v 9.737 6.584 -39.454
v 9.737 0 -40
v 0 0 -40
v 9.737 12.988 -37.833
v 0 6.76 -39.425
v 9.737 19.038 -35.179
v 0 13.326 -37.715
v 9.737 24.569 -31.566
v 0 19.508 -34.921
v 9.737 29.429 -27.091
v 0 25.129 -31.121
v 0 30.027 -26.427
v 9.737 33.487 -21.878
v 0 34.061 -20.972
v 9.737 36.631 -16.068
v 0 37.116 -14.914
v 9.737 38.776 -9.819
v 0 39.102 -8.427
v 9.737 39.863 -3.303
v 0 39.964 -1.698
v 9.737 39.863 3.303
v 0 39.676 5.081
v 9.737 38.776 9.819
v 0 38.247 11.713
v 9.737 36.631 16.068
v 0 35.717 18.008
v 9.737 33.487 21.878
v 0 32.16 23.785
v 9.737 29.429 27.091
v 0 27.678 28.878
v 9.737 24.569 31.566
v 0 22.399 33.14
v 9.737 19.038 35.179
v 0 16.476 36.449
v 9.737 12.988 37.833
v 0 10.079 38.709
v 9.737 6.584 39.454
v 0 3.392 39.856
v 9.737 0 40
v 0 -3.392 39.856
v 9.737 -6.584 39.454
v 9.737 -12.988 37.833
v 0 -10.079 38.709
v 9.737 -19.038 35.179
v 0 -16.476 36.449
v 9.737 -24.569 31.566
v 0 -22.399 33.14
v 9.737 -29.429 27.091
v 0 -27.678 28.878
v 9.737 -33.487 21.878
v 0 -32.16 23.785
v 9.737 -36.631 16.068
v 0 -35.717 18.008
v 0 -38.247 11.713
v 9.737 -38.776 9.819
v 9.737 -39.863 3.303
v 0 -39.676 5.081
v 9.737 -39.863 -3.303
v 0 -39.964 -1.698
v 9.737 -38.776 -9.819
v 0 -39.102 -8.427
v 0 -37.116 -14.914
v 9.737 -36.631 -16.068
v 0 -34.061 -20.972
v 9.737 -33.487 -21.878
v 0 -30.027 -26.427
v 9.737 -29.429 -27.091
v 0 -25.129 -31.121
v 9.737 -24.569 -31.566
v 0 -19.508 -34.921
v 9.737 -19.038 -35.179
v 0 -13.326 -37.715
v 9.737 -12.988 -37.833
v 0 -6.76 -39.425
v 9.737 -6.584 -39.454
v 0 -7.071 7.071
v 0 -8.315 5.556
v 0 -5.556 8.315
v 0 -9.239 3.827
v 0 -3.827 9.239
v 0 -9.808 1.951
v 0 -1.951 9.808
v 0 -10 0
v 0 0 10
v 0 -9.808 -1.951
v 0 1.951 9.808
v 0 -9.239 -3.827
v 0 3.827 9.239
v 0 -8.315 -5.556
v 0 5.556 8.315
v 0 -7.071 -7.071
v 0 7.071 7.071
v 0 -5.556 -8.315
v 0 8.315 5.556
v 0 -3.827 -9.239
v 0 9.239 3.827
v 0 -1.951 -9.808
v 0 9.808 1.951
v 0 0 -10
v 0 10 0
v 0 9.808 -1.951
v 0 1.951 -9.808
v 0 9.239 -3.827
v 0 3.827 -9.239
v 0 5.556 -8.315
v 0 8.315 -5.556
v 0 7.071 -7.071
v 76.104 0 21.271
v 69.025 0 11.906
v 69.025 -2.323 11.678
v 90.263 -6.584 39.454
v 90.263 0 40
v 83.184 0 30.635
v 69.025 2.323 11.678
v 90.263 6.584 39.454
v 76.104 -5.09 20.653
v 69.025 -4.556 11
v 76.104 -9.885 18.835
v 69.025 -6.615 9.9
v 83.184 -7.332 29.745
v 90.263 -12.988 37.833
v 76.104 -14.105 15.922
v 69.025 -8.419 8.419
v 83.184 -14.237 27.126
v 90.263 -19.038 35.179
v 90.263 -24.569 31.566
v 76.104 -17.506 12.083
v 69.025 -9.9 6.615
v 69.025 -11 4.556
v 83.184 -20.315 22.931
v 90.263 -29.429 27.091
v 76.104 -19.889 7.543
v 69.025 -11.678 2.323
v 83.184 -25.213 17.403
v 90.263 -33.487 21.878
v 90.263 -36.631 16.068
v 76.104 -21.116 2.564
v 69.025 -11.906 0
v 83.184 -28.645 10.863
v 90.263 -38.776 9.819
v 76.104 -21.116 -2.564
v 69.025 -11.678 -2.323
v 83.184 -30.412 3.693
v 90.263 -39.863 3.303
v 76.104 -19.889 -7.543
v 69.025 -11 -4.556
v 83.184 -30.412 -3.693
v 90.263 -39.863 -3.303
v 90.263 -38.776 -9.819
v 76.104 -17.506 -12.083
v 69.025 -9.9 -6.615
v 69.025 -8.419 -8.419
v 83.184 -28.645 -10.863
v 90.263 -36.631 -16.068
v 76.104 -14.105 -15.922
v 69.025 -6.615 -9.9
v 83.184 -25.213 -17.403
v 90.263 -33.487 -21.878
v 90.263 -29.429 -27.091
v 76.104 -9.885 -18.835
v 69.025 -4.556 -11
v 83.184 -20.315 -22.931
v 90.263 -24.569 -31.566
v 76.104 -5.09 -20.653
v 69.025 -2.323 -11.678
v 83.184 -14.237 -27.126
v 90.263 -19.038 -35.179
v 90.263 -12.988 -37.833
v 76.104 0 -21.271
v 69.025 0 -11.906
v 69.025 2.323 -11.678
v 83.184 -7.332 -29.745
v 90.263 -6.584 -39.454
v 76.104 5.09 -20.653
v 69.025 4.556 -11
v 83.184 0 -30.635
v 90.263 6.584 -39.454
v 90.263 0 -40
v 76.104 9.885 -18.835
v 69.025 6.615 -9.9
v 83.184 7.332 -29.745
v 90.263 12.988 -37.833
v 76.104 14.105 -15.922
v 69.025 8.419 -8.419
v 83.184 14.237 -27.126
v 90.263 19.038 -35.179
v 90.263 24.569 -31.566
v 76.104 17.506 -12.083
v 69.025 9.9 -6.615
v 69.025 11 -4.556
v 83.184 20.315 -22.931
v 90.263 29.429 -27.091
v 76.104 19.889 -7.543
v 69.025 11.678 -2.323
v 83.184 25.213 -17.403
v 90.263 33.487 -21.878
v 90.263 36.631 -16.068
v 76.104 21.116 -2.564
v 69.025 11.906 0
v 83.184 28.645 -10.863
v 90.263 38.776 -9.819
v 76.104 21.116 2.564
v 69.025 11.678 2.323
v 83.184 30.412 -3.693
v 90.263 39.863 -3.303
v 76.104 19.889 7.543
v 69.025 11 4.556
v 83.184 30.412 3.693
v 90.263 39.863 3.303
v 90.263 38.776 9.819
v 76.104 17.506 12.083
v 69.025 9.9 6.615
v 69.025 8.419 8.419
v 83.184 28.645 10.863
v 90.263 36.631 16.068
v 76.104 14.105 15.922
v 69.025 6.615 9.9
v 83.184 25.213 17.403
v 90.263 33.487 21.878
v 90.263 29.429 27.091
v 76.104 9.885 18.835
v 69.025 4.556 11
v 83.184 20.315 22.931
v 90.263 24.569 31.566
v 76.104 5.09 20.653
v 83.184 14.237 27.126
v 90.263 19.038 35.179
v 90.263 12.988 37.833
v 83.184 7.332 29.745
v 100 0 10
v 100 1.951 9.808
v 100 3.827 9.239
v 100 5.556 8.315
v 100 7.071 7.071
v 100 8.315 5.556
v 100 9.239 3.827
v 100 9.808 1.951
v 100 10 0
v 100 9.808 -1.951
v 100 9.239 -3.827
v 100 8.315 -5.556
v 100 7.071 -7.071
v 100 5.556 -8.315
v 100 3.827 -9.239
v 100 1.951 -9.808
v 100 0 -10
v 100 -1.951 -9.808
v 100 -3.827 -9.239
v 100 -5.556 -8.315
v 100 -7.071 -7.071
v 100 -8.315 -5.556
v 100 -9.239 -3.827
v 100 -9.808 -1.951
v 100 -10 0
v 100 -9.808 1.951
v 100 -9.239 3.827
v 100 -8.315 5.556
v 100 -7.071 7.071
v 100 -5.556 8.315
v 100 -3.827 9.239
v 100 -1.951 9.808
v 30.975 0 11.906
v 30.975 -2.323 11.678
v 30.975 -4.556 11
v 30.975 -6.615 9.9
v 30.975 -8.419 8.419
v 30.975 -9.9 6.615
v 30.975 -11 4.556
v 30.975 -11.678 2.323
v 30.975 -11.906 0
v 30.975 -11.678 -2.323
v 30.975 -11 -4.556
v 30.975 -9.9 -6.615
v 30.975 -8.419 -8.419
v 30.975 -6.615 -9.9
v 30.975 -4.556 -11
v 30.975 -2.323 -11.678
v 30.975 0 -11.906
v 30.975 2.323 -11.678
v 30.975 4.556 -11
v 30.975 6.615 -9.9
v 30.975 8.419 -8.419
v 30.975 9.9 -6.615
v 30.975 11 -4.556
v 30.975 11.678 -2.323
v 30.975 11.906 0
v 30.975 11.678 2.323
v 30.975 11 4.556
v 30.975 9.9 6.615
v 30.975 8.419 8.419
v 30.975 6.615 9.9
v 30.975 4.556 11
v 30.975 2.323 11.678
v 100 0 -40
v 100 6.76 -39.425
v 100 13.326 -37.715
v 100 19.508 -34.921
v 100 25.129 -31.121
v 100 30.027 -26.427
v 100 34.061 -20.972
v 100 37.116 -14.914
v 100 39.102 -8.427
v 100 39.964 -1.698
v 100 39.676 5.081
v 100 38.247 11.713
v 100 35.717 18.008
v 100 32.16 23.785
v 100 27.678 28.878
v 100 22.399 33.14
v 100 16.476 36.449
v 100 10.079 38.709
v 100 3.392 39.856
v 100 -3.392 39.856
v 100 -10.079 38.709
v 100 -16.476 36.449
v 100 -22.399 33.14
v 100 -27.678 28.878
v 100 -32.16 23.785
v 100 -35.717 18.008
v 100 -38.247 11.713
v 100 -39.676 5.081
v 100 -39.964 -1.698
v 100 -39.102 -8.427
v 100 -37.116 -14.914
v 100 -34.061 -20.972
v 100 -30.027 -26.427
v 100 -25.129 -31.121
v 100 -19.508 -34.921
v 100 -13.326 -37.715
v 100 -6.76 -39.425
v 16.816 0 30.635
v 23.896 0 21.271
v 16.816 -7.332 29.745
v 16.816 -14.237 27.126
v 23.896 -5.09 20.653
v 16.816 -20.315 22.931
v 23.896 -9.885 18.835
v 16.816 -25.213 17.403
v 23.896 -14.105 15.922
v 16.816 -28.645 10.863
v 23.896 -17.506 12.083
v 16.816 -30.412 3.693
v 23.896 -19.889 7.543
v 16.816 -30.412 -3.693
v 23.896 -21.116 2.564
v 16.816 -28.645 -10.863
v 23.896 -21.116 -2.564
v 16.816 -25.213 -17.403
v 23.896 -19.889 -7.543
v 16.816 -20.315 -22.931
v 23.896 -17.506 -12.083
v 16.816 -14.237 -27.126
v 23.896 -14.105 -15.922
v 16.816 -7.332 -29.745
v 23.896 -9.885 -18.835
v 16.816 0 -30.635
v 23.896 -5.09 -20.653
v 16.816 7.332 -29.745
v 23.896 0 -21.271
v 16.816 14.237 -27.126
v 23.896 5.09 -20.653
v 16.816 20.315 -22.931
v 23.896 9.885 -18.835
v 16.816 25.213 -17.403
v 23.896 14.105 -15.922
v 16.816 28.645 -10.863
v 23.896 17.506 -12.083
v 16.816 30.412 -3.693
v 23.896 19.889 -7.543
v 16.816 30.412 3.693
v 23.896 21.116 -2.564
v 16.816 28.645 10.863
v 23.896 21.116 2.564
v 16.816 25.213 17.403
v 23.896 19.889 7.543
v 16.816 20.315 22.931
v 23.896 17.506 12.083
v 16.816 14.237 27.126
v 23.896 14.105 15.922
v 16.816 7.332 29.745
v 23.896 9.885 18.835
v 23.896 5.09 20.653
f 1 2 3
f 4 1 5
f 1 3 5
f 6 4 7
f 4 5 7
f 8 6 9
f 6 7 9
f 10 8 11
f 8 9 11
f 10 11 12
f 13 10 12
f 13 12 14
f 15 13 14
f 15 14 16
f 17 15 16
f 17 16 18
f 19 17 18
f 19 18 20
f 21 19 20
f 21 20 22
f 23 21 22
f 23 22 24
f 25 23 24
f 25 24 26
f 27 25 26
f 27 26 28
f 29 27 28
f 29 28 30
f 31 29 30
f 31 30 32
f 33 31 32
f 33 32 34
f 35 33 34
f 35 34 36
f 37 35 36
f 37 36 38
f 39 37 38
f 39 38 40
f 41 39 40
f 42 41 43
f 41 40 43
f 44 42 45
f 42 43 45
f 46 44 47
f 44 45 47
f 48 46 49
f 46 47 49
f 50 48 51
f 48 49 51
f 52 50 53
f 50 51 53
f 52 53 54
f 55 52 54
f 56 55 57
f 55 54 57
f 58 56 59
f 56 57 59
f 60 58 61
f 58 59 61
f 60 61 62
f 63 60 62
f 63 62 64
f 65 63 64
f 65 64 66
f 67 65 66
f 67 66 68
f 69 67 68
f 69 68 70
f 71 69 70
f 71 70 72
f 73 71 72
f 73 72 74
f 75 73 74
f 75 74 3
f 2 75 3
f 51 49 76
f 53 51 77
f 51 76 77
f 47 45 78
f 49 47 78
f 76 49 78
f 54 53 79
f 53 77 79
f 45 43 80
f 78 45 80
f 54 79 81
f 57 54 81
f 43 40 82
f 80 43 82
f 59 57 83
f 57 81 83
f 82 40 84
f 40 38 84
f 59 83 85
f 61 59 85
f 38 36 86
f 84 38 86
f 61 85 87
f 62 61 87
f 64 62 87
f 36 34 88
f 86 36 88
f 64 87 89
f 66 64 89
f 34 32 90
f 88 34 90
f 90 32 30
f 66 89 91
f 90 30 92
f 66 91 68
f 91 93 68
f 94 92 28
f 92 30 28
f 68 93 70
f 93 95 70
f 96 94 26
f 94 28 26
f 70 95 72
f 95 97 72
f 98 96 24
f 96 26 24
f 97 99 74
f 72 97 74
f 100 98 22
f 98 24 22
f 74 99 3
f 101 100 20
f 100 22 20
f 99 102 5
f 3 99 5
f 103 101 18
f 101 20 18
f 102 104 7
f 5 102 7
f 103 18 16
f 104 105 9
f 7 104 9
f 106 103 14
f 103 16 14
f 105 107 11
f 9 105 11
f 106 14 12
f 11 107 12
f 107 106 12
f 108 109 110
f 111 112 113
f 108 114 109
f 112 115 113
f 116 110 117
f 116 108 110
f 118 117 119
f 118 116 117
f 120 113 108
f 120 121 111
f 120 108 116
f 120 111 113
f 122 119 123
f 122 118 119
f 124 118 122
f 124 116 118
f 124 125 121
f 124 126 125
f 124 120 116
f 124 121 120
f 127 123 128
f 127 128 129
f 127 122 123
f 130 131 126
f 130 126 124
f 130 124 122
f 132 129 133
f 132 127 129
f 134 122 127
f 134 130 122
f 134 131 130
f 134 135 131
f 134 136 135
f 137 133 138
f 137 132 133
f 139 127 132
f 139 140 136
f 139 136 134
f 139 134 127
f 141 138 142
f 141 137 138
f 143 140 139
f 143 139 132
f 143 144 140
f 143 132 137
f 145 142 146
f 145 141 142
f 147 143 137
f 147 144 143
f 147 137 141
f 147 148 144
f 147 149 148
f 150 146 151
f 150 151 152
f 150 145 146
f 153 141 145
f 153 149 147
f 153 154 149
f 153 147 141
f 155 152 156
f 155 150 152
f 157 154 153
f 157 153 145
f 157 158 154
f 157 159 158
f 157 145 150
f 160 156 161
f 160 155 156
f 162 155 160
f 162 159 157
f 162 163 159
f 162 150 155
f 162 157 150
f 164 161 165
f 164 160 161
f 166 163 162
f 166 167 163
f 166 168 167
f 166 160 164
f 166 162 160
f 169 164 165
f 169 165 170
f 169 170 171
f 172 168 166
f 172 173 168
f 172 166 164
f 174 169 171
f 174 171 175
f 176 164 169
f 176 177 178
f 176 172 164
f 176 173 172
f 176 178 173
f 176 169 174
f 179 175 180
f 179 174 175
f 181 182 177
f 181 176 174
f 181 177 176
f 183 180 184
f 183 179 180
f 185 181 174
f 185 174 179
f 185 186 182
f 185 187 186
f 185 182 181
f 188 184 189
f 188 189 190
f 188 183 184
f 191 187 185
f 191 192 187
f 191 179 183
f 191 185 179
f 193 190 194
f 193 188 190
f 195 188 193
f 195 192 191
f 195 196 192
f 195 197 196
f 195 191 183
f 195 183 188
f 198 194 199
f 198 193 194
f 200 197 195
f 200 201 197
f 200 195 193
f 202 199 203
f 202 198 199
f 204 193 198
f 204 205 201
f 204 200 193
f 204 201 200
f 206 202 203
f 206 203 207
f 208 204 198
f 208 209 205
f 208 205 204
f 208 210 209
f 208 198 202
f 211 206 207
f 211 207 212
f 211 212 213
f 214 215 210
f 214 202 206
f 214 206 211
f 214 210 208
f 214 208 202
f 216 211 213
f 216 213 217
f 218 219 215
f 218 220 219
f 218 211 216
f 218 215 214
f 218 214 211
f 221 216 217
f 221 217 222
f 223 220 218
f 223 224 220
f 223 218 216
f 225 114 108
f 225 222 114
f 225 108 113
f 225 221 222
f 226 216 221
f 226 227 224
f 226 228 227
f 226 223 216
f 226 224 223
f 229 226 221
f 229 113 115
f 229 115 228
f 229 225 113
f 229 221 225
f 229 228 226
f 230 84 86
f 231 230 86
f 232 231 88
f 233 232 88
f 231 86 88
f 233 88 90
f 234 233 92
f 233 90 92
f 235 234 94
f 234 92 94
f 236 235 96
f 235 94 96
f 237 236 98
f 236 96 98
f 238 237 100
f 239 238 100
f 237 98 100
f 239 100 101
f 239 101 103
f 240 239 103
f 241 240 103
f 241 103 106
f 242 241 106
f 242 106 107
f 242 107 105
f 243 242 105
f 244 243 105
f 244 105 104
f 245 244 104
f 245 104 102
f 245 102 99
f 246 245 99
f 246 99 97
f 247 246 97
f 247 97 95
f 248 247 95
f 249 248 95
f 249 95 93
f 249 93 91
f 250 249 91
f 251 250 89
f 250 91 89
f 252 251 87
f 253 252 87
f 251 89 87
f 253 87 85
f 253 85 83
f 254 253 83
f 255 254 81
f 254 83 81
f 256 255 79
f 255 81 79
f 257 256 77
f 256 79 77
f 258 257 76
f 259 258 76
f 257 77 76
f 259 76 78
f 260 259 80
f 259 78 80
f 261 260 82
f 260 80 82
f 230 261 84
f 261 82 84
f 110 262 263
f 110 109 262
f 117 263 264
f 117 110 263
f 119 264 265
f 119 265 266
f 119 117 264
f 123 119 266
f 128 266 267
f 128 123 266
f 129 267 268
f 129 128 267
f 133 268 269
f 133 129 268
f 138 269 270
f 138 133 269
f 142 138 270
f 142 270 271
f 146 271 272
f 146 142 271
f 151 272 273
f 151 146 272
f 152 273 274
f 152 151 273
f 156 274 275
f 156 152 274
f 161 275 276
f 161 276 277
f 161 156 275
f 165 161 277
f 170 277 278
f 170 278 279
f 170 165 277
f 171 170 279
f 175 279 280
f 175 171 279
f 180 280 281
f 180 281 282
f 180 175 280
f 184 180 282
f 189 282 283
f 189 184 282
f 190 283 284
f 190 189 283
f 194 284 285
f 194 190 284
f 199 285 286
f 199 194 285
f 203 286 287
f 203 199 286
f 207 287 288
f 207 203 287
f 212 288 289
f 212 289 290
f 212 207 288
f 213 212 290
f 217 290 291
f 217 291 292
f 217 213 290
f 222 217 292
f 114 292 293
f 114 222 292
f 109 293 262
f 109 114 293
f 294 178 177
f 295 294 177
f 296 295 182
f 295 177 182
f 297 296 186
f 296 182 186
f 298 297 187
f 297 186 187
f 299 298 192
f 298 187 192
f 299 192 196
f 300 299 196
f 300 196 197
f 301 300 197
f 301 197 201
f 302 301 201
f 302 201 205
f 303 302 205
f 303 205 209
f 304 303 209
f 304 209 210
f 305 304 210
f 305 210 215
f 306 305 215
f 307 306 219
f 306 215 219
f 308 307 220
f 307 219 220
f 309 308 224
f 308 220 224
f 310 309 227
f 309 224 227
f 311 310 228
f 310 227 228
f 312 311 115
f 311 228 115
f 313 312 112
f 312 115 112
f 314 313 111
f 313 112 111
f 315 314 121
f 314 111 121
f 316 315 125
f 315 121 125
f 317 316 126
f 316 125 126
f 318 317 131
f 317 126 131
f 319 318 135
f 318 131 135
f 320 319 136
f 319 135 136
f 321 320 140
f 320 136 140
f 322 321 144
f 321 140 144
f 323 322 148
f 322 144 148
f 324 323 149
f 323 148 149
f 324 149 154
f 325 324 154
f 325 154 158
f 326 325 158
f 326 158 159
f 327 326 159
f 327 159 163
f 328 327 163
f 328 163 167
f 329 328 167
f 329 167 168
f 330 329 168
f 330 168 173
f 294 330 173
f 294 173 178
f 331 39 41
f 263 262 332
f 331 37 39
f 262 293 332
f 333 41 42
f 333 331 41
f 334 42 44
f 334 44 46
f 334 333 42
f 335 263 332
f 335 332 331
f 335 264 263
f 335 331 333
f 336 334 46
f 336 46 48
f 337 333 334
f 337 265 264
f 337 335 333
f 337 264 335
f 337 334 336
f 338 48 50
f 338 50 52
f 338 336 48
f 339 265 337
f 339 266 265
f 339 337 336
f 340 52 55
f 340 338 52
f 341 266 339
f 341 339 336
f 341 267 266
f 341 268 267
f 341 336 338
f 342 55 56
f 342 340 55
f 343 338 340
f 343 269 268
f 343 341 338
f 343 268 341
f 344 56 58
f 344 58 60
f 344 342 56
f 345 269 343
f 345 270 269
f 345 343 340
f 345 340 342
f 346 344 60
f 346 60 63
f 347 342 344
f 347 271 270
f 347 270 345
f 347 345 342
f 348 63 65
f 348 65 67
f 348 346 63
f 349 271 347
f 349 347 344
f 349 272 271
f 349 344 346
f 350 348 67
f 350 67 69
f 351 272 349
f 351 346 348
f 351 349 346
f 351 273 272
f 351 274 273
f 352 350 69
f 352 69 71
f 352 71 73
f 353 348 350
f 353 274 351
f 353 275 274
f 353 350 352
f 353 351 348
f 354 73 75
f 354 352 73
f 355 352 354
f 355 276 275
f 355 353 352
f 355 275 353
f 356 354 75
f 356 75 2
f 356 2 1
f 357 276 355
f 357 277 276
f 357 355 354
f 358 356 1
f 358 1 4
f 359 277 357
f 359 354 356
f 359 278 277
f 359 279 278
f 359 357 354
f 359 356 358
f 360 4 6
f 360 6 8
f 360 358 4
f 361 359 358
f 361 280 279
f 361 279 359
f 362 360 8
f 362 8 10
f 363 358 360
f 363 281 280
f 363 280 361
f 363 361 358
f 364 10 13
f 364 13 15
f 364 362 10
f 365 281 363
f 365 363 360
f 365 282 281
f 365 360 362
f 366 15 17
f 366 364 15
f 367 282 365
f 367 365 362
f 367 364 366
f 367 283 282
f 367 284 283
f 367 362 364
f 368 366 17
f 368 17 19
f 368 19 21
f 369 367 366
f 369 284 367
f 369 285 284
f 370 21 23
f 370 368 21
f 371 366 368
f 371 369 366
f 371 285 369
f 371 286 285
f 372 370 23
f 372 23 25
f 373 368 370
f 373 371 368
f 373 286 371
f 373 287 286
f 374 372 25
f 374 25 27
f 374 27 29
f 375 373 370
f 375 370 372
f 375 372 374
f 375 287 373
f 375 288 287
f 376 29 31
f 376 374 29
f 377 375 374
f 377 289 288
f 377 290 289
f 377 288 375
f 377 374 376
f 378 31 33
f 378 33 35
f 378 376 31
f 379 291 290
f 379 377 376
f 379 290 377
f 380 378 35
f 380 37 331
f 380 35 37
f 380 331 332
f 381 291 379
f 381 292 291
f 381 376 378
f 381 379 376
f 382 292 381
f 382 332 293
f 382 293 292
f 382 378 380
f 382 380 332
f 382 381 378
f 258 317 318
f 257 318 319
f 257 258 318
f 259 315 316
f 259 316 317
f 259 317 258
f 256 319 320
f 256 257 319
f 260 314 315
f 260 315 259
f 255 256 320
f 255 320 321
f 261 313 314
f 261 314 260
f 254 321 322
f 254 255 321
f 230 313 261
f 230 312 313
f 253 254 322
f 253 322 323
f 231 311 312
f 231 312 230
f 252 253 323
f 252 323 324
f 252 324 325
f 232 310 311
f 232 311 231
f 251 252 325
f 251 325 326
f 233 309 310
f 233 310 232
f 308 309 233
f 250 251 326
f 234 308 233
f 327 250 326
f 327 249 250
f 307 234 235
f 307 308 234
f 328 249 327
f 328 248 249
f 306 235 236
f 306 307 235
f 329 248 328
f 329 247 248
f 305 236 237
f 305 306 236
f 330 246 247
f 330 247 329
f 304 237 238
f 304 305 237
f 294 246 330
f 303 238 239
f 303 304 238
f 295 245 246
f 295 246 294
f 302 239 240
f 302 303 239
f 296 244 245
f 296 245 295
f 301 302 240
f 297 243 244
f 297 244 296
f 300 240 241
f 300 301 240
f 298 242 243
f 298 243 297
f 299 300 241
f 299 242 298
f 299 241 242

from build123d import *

# Parameters (mm, degrees)
SKETCH1_R           = 40
BOSS_EXTRUDE1_DEPTH = 100
SKETCH3_R           = 10
CUT_EXTRUDE1_DEPTH  = 115.891252931


with BuildPart() as part:
    # Sketch1 → Boss-Extrude1 (new body)
    with BuildSketch(Plane(origin=(0, 0, 0), x_dir=(0, 0, -1), z_dir=(1, 0, 0))):
        Circle(SKETCH1_R)
    extrude(amount=BOSS_EXTRUDE1_DEPTH)

    # Sketch2 → Cut-Revolve1 (revolve, cut)
    with BuildSketch(Plane(origin=(0, 0, 0), x_dir=(1, 0, 0), z_dir=(0, 1, 0)), mode=Mode.PRIVATE) as cut_revolve1_sk:
        Polygon((9.736892583, 40), (30.975149321, 11.906444473), (69.024850679, 11.906444473), (90.263107417, 40), align=None)
    revolve(cut_revolve1_sk.sketch.rotate(Axis((0, 0, 0), (1, 0, 0)), 180), axis=Axis((0, 0, 0), (1, 0, 0)), mode=Mode.SUBTRACT)

    # Sketch3 → Cut-Extrude1 (cut, through all)
    with BuildSketch(Plane.ZY):
        Circle(SKETCH3_R)
    extrude(amount=-CUT_EXTRUDE1_DEPTH, mode=Mode.SUBTRACT)


solid = part.part
